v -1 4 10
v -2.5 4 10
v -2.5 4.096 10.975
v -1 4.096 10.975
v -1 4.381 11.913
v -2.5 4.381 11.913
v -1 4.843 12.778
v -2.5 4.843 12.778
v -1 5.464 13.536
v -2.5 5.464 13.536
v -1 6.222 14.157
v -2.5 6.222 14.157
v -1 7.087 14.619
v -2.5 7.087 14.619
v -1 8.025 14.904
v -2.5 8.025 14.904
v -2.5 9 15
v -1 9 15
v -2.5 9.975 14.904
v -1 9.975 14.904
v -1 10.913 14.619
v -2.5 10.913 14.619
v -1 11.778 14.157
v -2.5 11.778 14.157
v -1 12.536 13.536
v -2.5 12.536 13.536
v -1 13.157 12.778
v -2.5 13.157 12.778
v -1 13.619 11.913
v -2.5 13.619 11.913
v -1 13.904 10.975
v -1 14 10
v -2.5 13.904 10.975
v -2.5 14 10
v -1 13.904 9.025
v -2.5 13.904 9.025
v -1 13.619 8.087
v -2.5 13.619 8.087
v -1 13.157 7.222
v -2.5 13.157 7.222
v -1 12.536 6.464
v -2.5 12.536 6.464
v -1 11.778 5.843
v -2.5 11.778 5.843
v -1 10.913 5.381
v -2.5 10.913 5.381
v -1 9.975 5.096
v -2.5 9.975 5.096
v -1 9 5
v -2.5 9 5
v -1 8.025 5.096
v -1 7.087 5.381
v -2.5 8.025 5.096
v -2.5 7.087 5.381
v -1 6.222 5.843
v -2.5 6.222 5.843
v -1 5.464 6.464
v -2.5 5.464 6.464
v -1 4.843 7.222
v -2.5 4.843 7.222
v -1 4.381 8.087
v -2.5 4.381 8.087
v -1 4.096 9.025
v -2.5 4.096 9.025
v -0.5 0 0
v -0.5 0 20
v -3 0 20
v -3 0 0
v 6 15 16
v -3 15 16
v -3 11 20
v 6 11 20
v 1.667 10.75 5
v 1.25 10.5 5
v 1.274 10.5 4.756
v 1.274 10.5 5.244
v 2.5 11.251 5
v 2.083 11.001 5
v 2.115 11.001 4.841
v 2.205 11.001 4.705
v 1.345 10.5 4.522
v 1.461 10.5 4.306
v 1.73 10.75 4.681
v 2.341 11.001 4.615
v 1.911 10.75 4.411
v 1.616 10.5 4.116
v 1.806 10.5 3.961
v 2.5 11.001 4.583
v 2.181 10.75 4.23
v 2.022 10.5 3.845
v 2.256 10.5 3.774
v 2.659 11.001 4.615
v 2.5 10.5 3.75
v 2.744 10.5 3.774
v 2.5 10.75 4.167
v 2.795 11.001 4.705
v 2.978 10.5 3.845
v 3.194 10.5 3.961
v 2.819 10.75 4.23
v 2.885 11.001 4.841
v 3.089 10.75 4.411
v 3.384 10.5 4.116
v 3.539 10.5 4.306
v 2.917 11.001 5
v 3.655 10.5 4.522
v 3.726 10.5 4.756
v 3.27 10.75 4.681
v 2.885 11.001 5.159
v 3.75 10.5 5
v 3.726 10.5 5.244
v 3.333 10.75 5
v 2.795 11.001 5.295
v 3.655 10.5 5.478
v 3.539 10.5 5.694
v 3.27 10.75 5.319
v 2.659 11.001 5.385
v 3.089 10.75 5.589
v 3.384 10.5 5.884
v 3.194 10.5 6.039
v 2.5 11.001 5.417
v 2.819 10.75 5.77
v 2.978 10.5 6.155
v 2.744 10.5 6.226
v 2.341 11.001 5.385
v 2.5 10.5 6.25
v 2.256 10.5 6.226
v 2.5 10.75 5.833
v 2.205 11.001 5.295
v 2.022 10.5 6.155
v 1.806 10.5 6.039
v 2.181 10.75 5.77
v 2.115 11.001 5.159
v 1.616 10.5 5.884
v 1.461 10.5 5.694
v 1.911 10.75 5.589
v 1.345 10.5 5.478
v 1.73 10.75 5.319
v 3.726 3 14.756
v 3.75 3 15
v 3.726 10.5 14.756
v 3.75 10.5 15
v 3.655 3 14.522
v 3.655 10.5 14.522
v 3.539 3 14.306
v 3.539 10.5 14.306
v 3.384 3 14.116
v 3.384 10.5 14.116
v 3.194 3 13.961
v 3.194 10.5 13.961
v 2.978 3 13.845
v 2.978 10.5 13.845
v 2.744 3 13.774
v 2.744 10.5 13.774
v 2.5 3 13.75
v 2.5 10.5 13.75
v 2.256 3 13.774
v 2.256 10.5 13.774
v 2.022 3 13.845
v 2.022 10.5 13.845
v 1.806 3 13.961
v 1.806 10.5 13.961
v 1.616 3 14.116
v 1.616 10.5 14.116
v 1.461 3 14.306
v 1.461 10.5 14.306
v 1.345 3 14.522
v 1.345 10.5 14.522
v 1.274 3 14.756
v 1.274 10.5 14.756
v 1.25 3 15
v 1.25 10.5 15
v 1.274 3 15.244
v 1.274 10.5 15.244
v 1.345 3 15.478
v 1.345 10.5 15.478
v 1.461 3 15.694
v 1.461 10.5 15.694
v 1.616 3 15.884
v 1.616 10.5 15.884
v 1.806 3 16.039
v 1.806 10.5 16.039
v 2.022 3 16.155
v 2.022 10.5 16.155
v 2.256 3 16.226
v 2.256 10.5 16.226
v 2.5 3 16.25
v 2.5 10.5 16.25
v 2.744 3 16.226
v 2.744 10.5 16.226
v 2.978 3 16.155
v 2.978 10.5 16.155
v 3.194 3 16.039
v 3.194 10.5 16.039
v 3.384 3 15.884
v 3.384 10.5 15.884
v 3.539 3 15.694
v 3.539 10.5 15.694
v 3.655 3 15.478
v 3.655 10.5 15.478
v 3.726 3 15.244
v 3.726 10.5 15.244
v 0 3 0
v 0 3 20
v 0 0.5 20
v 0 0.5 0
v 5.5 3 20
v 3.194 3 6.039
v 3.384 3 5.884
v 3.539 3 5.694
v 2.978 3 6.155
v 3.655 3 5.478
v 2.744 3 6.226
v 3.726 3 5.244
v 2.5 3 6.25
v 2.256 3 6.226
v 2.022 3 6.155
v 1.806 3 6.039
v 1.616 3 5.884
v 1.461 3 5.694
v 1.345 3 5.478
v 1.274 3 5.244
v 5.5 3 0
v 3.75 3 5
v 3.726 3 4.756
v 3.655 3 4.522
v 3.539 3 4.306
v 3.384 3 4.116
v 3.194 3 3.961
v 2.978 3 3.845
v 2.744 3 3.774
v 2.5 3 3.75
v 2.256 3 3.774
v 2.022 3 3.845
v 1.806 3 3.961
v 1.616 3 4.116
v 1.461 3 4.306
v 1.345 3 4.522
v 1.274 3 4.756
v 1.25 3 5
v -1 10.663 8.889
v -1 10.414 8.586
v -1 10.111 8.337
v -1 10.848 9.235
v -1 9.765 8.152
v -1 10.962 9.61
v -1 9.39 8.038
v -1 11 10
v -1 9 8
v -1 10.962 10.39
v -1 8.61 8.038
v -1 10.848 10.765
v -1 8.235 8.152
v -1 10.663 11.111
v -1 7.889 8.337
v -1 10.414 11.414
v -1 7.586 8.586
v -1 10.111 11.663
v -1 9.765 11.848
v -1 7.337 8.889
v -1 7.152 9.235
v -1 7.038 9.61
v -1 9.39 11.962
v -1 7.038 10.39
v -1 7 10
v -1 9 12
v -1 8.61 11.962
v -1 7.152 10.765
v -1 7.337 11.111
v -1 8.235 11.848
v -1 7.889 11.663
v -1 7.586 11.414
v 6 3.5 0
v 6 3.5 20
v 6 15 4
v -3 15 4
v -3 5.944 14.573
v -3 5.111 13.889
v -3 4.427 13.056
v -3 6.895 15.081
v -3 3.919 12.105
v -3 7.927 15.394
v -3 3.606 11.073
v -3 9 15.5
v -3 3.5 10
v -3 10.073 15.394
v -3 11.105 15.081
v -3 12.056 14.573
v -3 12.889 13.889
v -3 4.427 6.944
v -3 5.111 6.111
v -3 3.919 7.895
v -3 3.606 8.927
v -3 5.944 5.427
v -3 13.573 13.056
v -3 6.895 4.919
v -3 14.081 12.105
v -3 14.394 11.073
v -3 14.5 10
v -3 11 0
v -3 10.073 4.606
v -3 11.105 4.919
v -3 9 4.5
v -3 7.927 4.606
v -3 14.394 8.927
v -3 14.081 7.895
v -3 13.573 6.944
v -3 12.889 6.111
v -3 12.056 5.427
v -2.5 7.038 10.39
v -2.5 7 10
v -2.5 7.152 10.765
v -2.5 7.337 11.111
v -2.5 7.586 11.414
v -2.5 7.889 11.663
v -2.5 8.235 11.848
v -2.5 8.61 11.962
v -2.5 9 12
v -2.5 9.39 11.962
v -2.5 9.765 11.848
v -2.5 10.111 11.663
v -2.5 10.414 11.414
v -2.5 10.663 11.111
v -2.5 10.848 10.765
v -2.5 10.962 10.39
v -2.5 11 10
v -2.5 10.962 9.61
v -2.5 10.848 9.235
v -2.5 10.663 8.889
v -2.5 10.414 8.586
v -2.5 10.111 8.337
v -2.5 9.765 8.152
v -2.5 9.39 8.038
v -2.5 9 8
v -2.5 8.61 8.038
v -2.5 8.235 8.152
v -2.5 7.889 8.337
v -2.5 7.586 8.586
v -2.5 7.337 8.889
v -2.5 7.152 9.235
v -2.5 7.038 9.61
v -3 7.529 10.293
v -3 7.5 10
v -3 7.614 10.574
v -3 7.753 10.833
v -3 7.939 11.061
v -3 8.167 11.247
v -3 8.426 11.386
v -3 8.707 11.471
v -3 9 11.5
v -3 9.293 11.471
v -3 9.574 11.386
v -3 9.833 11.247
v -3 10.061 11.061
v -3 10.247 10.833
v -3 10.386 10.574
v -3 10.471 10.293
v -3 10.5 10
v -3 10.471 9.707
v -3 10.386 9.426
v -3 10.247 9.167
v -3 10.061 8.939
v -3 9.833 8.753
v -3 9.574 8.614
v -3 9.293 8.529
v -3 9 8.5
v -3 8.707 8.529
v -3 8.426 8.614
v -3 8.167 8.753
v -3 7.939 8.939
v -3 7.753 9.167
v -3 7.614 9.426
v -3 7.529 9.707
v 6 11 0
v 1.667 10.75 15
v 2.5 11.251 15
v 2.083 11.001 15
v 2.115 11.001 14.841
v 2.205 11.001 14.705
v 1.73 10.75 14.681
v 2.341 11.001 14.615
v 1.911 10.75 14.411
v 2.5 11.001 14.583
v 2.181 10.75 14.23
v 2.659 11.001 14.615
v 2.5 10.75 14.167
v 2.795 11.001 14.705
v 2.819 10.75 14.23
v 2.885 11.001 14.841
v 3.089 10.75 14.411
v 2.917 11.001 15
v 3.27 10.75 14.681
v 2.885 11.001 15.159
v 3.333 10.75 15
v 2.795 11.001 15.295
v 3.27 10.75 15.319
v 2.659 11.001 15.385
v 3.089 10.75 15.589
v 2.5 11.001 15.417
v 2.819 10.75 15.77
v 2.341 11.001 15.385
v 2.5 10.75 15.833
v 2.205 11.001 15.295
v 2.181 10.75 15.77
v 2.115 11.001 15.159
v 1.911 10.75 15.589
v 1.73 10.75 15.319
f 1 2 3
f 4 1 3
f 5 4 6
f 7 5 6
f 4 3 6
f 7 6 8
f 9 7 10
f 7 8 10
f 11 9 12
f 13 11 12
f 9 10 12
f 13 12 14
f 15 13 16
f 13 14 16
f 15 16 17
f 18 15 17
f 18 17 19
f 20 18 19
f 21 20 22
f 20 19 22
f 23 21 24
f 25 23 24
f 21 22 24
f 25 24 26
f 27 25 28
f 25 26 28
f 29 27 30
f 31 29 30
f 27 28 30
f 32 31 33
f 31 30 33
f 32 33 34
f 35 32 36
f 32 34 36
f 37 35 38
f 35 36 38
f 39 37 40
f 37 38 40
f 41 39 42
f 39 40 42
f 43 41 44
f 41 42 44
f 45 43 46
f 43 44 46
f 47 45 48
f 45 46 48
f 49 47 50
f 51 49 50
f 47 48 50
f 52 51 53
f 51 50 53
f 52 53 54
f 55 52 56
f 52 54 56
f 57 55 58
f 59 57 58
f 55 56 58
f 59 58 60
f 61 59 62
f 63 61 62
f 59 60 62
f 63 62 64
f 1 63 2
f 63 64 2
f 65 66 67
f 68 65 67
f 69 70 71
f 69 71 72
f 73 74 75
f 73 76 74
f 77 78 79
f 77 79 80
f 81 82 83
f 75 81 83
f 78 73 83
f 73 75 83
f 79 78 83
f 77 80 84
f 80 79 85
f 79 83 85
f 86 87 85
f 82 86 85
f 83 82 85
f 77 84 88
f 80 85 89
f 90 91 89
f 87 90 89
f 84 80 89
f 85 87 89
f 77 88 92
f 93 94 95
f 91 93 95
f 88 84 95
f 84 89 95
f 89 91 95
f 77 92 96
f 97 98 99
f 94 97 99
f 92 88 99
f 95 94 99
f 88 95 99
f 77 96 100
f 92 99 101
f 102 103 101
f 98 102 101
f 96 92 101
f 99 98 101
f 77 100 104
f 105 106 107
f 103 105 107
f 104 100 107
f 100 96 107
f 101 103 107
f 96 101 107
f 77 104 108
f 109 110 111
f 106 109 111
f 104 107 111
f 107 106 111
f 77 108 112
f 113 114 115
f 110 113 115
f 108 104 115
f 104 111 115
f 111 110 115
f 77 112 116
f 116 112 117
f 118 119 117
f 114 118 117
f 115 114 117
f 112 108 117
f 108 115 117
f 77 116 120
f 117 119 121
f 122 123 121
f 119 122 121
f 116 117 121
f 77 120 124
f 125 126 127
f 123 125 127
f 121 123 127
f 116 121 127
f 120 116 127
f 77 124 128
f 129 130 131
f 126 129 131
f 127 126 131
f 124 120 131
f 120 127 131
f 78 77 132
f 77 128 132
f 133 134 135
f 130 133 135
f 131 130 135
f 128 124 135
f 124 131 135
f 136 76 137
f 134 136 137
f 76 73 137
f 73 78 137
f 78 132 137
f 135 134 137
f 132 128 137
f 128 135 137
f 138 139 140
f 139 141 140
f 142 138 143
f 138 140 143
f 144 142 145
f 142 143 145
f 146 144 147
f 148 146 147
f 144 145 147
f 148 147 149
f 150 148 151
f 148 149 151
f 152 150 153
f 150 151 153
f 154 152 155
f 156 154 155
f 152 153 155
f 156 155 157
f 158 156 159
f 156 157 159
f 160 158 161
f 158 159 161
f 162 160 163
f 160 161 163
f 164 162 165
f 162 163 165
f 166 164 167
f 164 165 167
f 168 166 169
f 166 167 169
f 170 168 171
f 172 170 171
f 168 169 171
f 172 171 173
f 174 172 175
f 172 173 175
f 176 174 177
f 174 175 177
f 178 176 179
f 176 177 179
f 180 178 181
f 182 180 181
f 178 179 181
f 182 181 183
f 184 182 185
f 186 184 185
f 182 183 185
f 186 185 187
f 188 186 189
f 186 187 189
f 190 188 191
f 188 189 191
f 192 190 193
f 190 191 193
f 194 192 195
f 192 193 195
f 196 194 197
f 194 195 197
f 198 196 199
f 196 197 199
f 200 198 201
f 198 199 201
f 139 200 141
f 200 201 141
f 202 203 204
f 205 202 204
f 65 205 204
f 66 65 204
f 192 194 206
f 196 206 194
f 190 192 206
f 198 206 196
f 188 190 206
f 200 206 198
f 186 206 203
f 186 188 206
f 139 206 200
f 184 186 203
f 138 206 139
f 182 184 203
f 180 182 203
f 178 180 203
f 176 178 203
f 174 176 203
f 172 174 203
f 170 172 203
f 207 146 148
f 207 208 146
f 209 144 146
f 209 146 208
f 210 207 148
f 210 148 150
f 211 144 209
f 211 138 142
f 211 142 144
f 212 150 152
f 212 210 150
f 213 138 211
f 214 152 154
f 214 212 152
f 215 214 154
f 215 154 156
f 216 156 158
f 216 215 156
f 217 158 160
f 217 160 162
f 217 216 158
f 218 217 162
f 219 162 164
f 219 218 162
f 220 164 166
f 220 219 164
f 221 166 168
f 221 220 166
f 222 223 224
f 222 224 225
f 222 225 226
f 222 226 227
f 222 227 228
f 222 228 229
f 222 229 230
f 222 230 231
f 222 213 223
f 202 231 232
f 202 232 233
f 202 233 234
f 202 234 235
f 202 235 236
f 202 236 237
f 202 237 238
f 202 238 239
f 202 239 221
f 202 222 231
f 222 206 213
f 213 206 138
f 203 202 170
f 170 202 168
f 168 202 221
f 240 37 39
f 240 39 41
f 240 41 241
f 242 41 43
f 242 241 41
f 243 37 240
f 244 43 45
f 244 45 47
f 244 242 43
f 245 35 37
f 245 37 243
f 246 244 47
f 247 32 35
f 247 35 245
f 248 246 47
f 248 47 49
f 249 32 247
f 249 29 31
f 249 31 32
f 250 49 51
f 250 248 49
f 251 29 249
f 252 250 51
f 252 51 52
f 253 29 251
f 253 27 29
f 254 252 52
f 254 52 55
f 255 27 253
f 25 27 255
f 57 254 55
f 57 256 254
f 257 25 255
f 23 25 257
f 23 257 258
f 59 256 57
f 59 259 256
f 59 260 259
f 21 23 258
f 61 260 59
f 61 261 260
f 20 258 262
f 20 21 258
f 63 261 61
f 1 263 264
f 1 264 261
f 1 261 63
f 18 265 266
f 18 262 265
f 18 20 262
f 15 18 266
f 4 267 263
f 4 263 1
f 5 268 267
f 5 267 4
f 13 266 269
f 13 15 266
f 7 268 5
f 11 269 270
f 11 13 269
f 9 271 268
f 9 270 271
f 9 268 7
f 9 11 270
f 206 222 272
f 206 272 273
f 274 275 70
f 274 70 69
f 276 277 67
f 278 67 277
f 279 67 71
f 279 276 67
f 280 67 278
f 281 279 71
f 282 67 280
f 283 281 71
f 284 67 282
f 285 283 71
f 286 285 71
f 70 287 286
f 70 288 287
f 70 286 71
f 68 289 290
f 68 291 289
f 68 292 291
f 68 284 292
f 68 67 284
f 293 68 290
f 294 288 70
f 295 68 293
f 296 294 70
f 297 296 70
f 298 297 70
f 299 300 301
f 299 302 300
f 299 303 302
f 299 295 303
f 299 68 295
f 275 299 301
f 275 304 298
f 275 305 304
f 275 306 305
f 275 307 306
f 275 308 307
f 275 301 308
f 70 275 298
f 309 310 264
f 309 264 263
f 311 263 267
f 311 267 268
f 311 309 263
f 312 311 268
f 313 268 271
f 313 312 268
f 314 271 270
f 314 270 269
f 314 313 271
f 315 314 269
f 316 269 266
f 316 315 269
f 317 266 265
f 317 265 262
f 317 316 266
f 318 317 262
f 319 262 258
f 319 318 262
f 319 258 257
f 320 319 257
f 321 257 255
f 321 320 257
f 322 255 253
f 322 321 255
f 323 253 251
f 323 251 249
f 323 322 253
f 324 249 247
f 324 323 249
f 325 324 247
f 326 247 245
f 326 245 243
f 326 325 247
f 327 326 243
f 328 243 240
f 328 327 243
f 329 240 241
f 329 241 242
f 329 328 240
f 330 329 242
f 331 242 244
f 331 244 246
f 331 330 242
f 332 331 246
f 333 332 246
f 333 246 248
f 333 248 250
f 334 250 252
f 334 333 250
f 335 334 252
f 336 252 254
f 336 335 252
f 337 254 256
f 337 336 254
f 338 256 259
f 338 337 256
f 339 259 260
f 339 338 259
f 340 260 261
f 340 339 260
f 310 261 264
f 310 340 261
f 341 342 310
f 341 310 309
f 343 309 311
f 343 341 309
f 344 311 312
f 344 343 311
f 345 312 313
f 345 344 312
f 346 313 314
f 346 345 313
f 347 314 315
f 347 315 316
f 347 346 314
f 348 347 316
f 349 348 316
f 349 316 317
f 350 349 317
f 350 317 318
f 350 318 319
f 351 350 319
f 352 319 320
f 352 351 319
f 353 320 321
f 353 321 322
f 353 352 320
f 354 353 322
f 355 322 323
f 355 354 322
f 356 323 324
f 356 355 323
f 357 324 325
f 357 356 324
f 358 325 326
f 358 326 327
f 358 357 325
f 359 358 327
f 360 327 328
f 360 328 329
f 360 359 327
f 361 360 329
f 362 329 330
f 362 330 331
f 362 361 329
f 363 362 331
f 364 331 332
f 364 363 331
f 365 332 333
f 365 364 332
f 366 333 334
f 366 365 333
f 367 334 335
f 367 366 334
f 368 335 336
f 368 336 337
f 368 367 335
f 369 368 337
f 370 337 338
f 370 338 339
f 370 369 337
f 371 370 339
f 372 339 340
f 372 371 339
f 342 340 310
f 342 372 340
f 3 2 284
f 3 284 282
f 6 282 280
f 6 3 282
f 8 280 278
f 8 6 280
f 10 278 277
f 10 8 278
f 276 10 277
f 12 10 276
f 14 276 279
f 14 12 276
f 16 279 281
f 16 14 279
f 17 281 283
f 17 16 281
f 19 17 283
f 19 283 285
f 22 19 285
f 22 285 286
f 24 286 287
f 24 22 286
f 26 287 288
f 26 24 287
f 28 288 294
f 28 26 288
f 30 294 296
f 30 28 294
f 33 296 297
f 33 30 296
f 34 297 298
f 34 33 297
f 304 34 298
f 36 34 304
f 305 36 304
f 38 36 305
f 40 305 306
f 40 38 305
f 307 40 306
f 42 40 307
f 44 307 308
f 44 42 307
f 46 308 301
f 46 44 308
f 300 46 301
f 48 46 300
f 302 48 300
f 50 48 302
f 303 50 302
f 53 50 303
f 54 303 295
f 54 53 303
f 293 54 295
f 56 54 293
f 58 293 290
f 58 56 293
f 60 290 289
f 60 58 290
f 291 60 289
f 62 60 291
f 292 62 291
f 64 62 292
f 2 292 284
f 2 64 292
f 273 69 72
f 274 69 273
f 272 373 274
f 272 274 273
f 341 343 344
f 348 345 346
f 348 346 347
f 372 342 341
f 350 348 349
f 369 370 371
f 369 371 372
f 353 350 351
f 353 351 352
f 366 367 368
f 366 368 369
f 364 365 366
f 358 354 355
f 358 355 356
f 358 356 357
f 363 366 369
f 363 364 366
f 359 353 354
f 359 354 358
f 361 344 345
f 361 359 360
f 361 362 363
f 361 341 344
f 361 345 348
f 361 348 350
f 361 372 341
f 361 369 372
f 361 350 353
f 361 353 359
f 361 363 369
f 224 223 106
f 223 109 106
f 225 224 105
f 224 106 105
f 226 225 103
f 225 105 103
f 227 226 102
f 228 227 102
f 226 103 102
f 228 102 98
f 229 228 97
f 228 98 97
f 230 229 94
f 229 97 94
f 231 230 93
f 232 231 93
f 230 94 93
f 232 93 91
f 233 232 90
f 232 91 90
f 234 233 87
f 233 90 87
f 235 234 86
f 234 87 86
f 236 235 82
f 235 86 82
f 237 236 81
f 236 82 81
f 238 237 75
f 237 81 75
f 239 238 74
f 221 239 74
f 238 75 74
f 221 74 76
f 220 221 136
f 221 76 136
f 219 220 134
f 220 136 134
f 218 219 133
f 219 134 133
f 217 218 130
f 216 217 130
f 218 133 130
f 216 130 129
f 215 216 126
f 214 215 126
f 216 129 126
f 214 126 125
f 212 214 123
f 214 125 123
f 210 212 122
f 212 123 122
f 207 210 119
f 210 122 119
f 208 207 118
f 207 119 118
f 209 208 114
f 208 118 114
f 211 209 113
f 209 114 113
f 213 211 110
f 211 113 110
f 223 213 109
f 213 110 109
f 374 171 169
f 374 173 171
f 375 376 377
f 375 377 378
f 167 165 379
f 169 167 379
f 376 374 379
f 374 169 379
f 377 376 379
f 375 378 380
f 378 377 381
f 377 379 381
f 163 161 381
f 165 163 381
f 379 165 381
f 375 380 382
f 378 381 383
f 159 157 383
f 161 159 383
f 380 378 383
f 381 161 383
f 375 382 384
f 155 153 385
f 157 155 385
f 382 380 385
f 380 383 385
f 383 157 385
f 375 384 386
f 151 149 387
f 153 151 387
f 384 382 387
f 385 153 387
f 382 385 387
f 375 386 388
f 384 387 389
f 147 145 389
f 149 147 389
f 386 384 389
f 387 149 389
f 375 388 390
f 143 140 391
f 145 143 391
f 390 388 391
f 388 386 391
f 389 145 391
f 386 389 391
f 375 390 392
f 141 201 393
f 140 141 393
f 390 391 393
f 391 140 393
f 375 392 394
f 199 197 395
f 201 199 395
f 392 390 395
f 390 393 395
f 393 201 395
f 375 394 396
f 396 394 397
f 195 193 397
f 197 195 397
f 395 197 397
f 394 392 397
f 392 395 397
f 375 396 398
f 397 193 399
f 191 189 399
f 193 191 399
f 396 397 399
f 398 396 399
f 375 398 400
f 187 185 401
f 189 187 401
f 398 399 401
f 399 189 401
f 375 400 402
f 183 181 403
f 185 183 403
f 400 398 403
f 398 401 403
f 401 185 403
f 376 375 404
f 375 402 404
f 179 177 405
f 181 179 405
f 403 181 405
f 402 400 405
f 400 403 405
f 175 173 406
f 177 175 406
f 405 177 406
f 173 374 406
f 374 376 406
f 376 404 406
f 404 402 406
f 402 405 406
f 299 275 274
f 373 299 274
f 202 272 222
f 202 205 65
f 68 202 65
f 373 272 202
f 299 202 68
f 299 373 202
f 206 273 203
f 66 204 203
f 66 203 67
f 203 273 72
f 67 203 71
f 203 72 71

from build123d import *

# Parameters (mm, degrees)
EXTRUDE_1_DEPTH        = 20
SKETCH_6_R             = 5
SKETCH_6_R_2           = 2
CUT_EXTRUDE_2_DEPTH    = 2
CHAMFER_2_SIZE         = 4
CHAMFER_3_SIZE         = 0.5
HOLE_WIZARD_M3_1_D     = 2.5
HOLE_WIZARD_M3_1_DEPTH = 7.5
HOLE_WIZARD_M3_1_TIP   = 0.751075774


with BuildPart() as part:
    # 草图1 → 凸台-拉伸1 (new body)
    with BuildSketch(Plane.XY):
        Polygon((0, 3), (0, 0), (-3, 0), (-3, 15), (6, 15), (6, 3), align=None)
    extrude(amount=EXTRUDE_1_DEPTH)

    # 草图6 → 切除-拉伸2 (cut)
    with BuildSketch(Plane.ZY.offset(3)):
        with Locations(Location((10, 9, 0), (0, 0, 270))):
            Circle(SKETCH_6_R)
        with Locations(Location((10, 9, 0), (0, 0, 270))):
            Circle(SKETCH_6_R_2, mode=Mode.SUBTRACT)
    extrude(amount=-CUT_EXTRUDE_2_DEPTH, mode=Mode.SUBTRACT)

    # 倒角2
    chamfer_2_edges = [part.edges().sort_by_distance(p)[0] for p in [
        (1.5, 15, 20),
        (1.5, 15, 0),
    ]]
    chamfer(chamfer_2_edges, length=CHAMFER_2_SIZE)

    # 倒角3
    chamfer_3_edges = [part.edges().sort_by_distance(p)[0] for p in [
        (6, 3, 10),
        (0, 0, 10),
        (-3, 14, 10),
        (-3, 11, 10),
    ]]
    chamfer(chamfer_3_edges, length=CHAMFER_3_SIZE)

    # M3 螺纹孔1
    with Locations(Plane(origin=(0, 3, 0), x_dir=(-1, 0, 0), z_dir=(0, -1, 0))):
        with Locations((-2.5, -5), (-2.5, -15)):
            Hole(HOLE_WIZARD_M3_1_D / 2, depth=HOLE_WIZARD_M3_1_DEPTH)
            with Locations((0, 0, -(HOLE_WIZARD_M3_1_DEPTH + HOLE_WIZARD_M3_1_TIP / 2))):  # 118° drill point
                Cone(0, HOLE_WIZARD_M3_1_D / 2, HOLE_WIZARD_M3_1_TIP, mode=Mode.SUBTRACT)


solid = part.part
